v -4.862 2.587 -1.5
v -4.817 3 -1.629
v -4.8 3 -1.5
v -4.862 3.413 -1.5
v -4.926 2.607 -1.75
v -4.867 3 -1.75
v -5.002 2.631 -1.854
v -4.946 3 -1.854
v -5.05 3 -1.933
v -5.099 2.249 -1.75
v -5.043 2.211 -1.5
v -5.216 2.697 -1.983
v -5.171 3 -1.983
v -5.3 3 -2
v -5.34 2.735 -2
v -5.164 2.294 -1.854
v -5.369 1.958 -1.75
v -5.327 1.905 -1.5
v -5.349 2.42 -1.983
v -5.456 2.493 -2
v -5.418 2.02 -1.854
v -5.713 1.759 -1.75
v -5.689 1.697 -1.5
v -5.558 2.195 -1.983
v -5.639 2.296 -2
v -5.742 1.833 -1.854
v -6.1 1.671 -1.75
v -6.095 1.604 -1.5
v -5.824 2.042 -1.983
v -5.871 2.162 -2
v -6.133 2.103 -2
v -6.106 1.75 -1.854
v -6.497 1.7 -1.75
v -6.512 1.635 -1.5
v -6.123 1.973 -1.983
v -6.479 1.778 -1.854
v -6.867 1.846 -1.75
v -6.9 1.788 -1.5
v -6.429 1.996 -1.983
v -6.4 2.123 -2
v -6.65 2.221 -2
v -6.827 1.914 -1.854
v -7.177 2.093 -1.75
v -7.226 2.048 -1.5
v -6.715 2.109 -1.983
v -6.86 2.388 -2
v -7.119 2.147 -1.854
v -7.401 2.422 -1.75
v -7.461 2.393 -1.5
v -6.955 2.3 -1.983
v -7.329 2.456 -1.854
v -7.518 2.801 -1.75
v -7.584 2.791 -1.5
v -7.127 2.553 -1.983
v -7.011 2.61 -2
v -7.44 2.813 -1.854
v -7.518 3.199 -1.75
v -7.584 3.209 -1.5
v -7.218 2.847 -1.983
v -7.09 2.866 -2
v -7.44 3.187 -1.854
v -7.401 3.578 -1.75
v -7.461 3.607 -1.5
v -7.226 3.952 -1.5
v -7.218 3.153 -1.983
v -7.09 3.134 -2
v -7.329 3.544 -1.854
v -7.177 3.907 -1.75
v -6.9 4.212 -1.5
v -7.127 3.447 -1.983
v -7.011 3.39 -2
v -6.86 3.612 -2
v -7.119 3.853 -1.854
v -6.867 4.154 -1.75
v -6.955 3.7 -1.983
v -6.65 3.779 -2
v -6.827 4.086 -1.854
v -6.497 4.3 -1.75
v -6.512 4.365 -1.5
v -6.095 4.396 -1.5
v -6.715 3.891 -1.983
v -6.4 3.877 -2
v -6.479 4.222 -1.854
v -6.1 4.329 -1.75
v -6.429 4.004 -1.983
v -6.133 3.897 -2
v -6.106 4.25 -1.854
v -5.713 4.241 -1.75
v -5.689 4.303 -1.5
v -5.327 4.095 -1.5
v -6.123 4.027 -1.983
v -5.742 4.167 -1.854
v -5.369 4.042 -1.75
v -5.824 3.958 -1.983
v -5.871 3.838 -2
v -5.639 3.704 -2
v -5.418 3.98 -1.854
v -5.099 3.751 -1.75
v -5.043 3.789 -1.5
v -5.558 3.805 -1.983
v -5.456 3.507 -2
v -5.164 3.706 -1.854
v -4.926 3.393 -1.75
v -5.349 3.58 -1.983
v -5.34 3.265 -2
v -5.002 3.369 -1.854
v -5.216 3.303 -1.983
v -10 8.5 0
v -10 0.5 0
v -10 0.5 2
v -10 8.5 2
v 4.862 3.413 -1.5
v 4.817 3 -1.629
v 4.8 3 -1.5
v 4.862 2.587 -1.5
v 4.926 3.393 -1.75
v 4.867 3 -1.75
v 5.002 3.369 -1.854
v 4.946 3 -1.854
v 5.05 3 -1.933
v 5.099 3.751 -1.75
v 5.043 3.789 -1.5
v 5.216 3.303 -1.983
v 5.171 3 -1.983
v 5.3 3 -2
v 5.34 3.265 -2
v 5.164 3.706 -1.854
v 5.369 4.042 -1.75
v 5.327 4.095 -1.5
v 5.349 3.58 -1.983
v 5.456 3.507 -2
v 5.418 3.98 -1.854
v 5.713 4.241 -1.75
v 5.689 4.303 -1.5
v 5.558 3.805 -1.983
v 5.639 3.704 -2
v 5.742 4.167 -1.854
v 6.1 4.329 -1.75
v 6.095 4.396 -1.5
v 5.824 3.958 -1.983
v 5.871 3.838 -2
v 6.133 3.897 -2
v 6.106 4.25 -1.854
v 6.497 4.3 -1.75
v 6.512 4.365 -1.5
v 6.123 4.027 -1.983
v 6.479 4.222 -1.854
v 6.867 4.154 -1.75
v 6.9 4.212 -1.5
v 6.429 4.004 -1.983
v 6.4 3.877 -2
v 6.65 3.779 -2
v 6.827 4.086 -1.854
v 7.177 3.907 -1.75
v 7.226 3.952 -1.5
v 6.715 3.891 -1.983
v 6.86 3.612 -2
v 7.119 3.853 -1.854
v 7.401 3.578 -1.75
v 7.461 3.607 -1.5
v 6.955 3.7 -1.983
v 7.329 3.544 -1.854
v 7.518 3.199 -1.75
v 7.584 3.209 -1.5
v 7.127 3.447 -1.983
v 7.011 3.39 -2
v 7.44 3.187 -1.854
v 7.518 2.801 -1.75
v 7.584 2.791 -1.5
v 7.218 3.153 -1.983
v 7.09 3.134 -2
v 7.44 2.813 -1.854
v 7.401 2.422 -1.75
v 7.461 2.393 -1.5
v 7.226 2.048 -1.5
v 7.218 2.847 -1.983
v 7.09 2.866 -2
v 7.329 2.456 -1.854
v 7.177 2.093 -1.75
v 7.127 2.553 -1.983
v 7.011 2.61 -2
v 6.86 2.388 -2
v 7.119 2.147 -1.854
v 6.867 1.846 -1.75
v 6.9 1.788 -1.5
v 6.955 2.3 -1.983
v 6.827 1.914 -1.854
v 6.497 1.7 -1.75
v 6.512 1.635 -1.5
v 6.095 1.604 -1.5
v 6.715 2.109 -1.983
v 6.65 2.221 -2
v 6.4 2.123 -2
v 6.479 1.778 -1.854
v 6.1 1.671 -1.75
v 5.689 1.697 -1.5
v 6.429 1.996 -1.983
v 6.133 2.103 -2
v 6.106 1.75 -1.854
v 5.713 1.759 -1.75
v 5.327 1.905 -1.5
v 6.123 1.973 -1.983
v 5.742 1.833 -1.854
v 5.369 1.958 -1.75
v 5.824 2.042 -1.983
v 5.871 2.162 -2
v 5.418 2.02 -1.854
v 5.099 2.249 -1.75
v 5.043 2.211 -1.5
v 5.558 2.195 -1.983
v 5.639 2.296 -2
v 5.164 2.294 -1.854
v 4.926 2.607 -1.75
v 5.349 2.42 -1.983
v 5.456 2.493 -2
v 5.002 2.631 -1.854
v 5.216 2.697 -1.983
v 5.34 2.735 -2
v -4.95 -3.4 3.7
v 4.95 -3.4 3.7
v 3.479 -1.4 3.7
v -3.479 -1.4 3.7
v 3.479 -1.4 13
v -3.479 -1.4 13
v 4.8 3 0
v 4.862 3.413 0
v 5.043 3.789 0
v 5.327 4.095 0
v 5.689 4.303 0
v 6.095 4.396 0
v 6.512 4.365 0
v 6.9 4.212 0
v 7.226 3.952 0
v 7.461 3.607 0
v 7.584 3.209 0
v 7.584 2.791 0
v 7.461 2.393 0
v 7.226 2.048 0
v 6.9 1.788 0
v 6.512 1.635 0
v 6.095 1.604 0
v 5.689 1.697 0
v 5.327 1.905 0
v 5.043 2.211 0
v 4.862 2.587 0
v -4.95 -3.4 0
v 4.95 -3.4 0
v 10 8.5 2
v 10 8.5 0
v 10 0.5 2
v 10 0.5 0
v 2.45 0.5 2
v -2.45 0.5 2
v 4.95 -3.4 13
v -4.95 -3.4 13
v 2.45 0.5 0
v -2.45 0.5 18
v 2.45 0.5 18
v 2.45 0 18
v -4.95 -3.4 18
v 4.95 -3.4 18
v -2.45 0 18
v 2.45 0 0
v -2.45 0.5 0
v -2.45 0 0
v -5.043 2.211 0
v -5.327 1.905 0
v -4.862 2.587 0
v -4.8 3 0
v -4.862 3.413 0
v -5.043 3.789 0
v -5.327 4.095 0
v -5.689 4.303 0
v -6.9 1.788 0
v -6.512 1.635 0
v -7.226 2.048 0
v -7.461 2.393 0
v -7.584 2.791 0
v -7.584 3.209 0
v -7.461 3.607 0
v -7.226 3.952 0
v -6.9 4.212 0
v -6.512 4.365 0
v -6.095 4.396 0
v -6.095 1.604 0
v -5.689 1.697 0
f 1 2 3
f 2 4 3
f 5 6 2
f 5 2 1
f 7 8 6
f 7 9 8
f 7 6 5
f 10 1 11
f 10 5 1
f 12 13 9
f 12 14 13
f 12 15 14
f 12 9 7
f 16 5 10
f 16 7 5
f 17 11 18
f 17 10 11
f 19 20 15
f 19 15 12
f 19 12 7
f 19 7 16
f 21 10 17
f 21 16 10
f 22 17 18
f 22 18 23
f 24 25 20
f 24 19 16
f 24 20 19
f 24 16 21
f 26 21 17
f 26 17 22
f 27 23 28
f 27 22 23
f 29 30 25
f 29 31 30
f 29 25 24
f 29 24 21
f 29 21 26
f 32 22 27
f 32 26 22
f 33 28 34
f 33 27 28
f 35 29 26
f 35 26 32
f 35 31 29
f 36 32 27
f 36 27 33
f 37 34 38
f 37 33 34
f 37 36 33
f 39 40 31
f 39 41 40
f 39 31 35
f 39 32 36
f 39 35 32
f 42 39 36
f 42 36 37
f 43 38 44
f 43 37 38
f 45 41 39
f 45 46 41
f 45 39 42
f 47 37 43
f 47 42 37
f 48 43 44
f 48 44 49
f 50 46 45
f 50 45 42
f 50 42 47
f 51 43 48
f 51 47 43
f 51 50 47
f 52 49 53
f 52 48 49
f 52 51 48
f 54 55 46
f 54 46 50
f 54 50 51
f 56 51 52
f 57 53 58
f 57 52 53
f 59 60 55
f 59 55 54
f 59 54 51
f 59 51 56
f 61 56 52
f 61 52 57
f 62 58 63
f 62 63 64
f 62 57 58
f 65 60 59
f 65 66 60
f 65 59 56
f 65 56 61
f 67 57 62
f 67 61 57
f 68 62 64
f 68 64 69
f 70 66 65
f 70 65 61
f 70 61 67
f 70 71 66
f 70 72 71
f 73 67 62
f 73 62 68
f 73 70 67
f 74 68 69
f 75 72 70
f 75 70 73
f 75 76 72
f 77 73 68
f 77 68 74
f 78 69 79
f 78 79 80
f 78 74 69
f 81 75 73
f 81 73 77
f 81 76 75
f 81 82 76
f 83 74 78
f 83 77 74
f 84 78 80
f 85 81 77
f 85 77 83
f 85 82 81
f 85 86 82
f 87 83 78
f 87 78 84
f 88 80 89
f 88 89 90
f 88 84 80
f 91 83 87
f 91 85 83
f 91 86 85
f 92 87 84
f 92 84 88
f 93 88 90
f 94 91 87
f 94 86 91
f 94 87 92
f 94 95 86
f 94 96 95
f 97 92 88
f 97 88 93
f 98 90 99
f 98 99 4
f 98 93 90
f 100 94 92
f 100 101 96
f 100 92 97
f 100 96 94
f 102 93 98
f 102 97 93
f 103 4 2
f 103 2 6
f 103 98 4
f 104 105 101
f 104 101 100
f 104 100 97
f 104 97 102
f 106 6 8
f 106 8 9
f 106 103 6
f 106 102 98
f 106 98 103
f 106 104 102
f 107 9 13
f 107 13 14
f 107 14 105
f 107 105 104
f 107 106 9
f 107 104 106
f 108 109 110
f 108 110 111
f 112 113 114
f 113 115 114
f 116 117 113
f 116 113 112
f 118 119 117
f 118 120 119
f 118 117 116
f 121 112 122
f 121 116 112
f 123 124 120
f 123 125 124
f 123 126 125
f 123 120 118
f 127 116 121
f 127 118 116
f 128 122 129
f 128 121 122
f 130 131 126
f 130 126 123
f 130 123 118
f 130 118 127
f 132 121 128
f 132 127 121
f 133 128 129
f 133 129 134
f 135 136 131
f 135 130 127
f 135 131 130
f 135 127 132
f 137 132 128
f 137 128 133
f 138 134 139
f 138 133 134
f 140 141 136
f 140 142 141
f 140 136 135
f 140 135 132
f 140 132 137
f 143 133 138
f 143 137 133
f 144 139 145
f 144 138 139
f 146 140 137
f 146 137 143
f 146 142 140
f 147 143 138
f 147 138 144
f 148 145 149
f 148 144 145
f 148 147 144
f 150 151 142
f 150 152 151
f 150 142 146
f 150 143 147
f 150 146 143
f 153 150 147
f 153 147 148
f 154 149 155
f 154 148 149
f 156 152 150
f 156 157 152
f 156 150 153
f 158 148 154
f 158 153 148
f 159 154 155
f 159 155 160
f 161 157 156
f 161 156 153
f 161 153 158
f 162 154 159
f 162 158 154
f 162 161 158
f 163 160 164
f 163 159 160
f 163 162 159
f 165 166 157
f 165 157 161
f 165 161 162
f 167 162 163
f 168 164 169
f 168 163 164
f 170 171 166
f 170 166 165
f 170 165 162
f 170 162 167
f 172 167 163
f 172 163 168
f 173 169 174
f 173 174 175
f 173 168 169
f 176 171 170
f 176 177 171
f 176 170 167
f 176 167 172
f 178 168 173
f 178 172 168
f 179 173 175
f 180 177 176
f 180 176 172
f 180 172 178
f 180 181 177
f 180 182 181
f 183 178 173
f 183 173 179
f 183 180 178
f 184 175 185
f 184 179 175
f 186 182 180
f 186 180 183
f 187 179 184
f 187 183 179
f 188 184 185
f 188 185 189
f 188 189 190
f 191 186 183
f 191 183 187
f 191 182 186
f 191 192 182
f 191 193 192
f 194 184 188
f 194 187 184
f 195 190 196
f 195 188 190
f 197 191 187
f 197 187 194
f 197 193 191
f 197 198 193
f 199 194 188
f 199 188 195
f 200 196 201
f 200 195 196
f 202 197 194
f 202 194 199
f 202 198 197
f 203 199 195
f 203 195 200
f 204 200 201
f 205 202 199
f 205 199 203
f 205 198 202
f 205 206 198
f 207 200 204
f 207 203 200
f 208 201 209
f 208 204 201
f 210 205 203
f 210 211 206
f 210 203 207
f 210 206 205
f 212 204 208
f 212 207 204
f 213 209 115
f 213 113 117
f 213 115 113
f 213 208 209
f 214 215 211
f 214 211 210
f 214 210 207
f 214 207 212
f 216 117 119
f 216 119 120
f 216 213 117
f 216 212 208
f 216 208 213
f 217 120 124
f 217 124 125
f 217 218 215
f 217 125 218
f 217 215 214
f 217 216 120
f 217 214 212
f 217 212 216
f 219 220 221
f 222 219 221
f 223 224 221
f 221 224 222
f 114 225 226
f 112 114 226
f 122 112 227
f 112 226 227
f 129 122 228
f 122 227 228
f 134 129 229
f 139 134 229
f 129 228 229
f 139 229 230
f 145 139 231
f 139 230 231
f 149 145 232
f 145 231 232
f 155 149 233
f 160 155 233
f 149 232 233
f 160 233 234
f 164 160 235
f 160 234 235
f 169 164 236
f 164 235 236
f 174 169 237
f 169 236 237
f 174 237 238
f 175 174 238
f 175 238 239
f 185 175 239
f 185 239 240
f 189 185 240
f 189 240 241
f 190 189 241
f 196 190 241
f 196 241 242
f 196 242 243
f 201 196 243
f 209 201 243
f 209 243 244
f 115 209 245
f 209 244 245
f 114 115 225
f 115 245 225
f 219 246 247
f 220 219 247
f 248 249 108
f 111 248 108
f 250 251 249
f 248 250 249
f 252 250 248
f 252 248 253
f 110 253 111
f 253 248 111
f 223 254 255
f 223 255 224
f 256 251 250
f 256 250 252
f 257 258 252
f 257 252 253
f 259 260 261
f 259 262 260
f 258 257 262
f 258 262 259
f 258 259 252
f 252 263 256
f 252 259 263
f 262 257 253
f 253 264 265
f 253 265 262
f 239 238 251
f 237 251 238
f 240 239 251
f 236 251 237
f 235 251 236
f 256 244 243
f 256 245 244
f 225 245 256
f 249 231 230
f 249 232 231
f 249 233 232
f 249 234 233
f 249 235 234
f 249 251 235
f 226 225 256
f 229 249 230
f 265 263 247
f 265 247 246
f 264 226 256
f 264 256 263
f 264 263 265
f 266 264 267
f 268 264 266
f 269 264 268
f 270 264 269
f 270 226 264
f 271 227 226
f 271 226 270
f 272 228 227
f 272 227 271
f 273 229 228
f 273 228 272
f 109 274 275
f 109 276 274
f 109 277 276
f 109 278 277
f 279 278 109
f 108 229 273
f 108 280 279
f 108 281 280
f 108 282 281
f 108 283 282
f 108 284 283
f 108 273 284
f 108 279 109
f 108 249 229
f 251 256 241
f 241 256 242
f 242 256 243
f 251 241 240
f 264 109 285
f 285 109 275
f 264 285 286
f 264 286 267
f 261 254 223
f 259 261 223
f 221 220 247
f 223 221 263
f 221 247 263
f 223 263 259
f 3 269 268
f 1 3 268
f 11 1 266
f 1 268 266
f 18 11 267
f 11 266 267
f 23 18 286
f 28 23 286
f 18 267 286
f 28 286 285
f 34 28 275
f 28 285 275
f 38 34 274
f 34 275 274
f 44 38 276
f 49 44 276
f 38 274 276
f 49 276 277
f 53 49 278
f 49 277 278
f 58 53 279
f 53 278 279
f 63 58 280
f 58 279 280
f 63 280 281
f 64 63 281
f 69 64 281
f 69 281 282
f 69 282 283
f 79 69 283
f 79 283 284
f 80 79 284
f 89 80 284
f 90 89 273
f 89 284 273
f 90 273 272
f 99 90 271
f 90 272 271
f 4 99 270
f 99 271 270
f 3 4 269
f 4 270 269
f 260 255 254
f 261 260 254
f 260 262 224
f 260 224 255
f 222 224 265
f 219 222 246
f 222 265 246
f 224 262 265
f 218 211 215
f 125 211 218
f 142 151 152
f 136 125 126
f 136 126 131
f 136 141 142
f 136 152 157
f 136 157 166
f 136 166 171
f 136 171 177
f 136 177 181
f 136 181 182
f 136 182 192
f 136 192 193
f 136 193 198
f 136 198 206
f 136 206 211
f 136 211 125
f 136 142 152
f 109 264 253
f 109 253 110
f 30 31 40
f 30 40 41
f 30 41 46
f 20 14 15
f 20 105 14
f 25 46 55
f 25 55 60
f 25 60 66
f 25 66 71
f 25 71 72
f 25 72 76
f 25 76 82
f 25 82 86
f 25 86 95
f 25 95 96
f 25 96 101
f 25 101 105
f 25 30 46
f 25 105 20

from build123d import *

# Parameters (mm, degrees)
BOSS_EXTRUDE1_DEPTH     = 18
SKETCH2_W               = 20
SKETCH2_H               = 8
BOSS_EXTRUDE2_DEPTH     = 2
CUT_EXTRUDE1_DEPTH      = 23.27666941
CUT_EXTRUDE1_DEPTH_BACK = 23.27666941
SKETCH3_W               = 9.3
SKETCH3_H               = 2
SKETCH4_R               = 1.4
BOSS_EXTRUDE3_DEPTH     = 2
FILLET1_R               = 0.5


with BuildPart() as part:
    # Sketch1 → Boss-Extrude1 (new body)
    with BuildSketch(Plane.XY):
        Polygon((-4.95, -3.4), (4.95, -3.4), (2.45, 0), (2.45, 0.5), (-2.45, 0.5), (-2.45, 0), align=None)
    extrude(amount=BOSS_EXTRUDE1_DEPTH)

    # Sketch2 → Boss-Extrude2 (add)
    with BuildSketch(Plane(origin=(0, 0, 0), x_dir=(-1, 0, 0), z_dir=(0, 0, -1))):
        with Locations((0, 4.5)):
            Rectangle(SKETCH2_W, SKETCH2_H)
    extrude(amount=-BOSS_EXTRUDE2_DEPTH)

    # Sketch3 → Cut-Extrude1 (cut, two sides: drawn at the far end of the back side and taken through both)
    with BuildSketch(Plane(origin=(0, 0, 0), x_dir=(0, 0, -1), z_dir=(1, 0, 0)).offset(-CUT_EXTRUDE1_DEPTH_BACK)):
        with Locations((-8.35, -2.4)):
            Rectangle(SKETCH3_W, SKETCH3_H)
    extrude(amount=CUT_EXTRUDE1_DEPTH + CUT_EXTRUDE1_DEPTH_BACK, mode=Mode.SUBTRACT)

    # Sketch4 → Boss-Extrude3 (add)
    with BuildSketch(Plane(origin=(0, 0, 0), x_dir=(-1, 0, 0), z_dir=(0, 0, -1))):
        with Locations((-6.2, 3)):
            Circle(SKETCH4_R)
        with Locations(Location((6.2, 3, 0), (0, 0, 180))):
            Circle(SKETCH4_R)
    extrude(amount=BOSS_EXTRUDE3_DEPTH)

    # Fillet1
    fillet1_edges = [part.edges().sort_by_distance(p)[0] for p in [
        (7.6, 3, -2),
        (-7.6, 3, -2),
    ]]
    fillet(fillet1_edges, radius=FILLET1_R)


solid = part.part
